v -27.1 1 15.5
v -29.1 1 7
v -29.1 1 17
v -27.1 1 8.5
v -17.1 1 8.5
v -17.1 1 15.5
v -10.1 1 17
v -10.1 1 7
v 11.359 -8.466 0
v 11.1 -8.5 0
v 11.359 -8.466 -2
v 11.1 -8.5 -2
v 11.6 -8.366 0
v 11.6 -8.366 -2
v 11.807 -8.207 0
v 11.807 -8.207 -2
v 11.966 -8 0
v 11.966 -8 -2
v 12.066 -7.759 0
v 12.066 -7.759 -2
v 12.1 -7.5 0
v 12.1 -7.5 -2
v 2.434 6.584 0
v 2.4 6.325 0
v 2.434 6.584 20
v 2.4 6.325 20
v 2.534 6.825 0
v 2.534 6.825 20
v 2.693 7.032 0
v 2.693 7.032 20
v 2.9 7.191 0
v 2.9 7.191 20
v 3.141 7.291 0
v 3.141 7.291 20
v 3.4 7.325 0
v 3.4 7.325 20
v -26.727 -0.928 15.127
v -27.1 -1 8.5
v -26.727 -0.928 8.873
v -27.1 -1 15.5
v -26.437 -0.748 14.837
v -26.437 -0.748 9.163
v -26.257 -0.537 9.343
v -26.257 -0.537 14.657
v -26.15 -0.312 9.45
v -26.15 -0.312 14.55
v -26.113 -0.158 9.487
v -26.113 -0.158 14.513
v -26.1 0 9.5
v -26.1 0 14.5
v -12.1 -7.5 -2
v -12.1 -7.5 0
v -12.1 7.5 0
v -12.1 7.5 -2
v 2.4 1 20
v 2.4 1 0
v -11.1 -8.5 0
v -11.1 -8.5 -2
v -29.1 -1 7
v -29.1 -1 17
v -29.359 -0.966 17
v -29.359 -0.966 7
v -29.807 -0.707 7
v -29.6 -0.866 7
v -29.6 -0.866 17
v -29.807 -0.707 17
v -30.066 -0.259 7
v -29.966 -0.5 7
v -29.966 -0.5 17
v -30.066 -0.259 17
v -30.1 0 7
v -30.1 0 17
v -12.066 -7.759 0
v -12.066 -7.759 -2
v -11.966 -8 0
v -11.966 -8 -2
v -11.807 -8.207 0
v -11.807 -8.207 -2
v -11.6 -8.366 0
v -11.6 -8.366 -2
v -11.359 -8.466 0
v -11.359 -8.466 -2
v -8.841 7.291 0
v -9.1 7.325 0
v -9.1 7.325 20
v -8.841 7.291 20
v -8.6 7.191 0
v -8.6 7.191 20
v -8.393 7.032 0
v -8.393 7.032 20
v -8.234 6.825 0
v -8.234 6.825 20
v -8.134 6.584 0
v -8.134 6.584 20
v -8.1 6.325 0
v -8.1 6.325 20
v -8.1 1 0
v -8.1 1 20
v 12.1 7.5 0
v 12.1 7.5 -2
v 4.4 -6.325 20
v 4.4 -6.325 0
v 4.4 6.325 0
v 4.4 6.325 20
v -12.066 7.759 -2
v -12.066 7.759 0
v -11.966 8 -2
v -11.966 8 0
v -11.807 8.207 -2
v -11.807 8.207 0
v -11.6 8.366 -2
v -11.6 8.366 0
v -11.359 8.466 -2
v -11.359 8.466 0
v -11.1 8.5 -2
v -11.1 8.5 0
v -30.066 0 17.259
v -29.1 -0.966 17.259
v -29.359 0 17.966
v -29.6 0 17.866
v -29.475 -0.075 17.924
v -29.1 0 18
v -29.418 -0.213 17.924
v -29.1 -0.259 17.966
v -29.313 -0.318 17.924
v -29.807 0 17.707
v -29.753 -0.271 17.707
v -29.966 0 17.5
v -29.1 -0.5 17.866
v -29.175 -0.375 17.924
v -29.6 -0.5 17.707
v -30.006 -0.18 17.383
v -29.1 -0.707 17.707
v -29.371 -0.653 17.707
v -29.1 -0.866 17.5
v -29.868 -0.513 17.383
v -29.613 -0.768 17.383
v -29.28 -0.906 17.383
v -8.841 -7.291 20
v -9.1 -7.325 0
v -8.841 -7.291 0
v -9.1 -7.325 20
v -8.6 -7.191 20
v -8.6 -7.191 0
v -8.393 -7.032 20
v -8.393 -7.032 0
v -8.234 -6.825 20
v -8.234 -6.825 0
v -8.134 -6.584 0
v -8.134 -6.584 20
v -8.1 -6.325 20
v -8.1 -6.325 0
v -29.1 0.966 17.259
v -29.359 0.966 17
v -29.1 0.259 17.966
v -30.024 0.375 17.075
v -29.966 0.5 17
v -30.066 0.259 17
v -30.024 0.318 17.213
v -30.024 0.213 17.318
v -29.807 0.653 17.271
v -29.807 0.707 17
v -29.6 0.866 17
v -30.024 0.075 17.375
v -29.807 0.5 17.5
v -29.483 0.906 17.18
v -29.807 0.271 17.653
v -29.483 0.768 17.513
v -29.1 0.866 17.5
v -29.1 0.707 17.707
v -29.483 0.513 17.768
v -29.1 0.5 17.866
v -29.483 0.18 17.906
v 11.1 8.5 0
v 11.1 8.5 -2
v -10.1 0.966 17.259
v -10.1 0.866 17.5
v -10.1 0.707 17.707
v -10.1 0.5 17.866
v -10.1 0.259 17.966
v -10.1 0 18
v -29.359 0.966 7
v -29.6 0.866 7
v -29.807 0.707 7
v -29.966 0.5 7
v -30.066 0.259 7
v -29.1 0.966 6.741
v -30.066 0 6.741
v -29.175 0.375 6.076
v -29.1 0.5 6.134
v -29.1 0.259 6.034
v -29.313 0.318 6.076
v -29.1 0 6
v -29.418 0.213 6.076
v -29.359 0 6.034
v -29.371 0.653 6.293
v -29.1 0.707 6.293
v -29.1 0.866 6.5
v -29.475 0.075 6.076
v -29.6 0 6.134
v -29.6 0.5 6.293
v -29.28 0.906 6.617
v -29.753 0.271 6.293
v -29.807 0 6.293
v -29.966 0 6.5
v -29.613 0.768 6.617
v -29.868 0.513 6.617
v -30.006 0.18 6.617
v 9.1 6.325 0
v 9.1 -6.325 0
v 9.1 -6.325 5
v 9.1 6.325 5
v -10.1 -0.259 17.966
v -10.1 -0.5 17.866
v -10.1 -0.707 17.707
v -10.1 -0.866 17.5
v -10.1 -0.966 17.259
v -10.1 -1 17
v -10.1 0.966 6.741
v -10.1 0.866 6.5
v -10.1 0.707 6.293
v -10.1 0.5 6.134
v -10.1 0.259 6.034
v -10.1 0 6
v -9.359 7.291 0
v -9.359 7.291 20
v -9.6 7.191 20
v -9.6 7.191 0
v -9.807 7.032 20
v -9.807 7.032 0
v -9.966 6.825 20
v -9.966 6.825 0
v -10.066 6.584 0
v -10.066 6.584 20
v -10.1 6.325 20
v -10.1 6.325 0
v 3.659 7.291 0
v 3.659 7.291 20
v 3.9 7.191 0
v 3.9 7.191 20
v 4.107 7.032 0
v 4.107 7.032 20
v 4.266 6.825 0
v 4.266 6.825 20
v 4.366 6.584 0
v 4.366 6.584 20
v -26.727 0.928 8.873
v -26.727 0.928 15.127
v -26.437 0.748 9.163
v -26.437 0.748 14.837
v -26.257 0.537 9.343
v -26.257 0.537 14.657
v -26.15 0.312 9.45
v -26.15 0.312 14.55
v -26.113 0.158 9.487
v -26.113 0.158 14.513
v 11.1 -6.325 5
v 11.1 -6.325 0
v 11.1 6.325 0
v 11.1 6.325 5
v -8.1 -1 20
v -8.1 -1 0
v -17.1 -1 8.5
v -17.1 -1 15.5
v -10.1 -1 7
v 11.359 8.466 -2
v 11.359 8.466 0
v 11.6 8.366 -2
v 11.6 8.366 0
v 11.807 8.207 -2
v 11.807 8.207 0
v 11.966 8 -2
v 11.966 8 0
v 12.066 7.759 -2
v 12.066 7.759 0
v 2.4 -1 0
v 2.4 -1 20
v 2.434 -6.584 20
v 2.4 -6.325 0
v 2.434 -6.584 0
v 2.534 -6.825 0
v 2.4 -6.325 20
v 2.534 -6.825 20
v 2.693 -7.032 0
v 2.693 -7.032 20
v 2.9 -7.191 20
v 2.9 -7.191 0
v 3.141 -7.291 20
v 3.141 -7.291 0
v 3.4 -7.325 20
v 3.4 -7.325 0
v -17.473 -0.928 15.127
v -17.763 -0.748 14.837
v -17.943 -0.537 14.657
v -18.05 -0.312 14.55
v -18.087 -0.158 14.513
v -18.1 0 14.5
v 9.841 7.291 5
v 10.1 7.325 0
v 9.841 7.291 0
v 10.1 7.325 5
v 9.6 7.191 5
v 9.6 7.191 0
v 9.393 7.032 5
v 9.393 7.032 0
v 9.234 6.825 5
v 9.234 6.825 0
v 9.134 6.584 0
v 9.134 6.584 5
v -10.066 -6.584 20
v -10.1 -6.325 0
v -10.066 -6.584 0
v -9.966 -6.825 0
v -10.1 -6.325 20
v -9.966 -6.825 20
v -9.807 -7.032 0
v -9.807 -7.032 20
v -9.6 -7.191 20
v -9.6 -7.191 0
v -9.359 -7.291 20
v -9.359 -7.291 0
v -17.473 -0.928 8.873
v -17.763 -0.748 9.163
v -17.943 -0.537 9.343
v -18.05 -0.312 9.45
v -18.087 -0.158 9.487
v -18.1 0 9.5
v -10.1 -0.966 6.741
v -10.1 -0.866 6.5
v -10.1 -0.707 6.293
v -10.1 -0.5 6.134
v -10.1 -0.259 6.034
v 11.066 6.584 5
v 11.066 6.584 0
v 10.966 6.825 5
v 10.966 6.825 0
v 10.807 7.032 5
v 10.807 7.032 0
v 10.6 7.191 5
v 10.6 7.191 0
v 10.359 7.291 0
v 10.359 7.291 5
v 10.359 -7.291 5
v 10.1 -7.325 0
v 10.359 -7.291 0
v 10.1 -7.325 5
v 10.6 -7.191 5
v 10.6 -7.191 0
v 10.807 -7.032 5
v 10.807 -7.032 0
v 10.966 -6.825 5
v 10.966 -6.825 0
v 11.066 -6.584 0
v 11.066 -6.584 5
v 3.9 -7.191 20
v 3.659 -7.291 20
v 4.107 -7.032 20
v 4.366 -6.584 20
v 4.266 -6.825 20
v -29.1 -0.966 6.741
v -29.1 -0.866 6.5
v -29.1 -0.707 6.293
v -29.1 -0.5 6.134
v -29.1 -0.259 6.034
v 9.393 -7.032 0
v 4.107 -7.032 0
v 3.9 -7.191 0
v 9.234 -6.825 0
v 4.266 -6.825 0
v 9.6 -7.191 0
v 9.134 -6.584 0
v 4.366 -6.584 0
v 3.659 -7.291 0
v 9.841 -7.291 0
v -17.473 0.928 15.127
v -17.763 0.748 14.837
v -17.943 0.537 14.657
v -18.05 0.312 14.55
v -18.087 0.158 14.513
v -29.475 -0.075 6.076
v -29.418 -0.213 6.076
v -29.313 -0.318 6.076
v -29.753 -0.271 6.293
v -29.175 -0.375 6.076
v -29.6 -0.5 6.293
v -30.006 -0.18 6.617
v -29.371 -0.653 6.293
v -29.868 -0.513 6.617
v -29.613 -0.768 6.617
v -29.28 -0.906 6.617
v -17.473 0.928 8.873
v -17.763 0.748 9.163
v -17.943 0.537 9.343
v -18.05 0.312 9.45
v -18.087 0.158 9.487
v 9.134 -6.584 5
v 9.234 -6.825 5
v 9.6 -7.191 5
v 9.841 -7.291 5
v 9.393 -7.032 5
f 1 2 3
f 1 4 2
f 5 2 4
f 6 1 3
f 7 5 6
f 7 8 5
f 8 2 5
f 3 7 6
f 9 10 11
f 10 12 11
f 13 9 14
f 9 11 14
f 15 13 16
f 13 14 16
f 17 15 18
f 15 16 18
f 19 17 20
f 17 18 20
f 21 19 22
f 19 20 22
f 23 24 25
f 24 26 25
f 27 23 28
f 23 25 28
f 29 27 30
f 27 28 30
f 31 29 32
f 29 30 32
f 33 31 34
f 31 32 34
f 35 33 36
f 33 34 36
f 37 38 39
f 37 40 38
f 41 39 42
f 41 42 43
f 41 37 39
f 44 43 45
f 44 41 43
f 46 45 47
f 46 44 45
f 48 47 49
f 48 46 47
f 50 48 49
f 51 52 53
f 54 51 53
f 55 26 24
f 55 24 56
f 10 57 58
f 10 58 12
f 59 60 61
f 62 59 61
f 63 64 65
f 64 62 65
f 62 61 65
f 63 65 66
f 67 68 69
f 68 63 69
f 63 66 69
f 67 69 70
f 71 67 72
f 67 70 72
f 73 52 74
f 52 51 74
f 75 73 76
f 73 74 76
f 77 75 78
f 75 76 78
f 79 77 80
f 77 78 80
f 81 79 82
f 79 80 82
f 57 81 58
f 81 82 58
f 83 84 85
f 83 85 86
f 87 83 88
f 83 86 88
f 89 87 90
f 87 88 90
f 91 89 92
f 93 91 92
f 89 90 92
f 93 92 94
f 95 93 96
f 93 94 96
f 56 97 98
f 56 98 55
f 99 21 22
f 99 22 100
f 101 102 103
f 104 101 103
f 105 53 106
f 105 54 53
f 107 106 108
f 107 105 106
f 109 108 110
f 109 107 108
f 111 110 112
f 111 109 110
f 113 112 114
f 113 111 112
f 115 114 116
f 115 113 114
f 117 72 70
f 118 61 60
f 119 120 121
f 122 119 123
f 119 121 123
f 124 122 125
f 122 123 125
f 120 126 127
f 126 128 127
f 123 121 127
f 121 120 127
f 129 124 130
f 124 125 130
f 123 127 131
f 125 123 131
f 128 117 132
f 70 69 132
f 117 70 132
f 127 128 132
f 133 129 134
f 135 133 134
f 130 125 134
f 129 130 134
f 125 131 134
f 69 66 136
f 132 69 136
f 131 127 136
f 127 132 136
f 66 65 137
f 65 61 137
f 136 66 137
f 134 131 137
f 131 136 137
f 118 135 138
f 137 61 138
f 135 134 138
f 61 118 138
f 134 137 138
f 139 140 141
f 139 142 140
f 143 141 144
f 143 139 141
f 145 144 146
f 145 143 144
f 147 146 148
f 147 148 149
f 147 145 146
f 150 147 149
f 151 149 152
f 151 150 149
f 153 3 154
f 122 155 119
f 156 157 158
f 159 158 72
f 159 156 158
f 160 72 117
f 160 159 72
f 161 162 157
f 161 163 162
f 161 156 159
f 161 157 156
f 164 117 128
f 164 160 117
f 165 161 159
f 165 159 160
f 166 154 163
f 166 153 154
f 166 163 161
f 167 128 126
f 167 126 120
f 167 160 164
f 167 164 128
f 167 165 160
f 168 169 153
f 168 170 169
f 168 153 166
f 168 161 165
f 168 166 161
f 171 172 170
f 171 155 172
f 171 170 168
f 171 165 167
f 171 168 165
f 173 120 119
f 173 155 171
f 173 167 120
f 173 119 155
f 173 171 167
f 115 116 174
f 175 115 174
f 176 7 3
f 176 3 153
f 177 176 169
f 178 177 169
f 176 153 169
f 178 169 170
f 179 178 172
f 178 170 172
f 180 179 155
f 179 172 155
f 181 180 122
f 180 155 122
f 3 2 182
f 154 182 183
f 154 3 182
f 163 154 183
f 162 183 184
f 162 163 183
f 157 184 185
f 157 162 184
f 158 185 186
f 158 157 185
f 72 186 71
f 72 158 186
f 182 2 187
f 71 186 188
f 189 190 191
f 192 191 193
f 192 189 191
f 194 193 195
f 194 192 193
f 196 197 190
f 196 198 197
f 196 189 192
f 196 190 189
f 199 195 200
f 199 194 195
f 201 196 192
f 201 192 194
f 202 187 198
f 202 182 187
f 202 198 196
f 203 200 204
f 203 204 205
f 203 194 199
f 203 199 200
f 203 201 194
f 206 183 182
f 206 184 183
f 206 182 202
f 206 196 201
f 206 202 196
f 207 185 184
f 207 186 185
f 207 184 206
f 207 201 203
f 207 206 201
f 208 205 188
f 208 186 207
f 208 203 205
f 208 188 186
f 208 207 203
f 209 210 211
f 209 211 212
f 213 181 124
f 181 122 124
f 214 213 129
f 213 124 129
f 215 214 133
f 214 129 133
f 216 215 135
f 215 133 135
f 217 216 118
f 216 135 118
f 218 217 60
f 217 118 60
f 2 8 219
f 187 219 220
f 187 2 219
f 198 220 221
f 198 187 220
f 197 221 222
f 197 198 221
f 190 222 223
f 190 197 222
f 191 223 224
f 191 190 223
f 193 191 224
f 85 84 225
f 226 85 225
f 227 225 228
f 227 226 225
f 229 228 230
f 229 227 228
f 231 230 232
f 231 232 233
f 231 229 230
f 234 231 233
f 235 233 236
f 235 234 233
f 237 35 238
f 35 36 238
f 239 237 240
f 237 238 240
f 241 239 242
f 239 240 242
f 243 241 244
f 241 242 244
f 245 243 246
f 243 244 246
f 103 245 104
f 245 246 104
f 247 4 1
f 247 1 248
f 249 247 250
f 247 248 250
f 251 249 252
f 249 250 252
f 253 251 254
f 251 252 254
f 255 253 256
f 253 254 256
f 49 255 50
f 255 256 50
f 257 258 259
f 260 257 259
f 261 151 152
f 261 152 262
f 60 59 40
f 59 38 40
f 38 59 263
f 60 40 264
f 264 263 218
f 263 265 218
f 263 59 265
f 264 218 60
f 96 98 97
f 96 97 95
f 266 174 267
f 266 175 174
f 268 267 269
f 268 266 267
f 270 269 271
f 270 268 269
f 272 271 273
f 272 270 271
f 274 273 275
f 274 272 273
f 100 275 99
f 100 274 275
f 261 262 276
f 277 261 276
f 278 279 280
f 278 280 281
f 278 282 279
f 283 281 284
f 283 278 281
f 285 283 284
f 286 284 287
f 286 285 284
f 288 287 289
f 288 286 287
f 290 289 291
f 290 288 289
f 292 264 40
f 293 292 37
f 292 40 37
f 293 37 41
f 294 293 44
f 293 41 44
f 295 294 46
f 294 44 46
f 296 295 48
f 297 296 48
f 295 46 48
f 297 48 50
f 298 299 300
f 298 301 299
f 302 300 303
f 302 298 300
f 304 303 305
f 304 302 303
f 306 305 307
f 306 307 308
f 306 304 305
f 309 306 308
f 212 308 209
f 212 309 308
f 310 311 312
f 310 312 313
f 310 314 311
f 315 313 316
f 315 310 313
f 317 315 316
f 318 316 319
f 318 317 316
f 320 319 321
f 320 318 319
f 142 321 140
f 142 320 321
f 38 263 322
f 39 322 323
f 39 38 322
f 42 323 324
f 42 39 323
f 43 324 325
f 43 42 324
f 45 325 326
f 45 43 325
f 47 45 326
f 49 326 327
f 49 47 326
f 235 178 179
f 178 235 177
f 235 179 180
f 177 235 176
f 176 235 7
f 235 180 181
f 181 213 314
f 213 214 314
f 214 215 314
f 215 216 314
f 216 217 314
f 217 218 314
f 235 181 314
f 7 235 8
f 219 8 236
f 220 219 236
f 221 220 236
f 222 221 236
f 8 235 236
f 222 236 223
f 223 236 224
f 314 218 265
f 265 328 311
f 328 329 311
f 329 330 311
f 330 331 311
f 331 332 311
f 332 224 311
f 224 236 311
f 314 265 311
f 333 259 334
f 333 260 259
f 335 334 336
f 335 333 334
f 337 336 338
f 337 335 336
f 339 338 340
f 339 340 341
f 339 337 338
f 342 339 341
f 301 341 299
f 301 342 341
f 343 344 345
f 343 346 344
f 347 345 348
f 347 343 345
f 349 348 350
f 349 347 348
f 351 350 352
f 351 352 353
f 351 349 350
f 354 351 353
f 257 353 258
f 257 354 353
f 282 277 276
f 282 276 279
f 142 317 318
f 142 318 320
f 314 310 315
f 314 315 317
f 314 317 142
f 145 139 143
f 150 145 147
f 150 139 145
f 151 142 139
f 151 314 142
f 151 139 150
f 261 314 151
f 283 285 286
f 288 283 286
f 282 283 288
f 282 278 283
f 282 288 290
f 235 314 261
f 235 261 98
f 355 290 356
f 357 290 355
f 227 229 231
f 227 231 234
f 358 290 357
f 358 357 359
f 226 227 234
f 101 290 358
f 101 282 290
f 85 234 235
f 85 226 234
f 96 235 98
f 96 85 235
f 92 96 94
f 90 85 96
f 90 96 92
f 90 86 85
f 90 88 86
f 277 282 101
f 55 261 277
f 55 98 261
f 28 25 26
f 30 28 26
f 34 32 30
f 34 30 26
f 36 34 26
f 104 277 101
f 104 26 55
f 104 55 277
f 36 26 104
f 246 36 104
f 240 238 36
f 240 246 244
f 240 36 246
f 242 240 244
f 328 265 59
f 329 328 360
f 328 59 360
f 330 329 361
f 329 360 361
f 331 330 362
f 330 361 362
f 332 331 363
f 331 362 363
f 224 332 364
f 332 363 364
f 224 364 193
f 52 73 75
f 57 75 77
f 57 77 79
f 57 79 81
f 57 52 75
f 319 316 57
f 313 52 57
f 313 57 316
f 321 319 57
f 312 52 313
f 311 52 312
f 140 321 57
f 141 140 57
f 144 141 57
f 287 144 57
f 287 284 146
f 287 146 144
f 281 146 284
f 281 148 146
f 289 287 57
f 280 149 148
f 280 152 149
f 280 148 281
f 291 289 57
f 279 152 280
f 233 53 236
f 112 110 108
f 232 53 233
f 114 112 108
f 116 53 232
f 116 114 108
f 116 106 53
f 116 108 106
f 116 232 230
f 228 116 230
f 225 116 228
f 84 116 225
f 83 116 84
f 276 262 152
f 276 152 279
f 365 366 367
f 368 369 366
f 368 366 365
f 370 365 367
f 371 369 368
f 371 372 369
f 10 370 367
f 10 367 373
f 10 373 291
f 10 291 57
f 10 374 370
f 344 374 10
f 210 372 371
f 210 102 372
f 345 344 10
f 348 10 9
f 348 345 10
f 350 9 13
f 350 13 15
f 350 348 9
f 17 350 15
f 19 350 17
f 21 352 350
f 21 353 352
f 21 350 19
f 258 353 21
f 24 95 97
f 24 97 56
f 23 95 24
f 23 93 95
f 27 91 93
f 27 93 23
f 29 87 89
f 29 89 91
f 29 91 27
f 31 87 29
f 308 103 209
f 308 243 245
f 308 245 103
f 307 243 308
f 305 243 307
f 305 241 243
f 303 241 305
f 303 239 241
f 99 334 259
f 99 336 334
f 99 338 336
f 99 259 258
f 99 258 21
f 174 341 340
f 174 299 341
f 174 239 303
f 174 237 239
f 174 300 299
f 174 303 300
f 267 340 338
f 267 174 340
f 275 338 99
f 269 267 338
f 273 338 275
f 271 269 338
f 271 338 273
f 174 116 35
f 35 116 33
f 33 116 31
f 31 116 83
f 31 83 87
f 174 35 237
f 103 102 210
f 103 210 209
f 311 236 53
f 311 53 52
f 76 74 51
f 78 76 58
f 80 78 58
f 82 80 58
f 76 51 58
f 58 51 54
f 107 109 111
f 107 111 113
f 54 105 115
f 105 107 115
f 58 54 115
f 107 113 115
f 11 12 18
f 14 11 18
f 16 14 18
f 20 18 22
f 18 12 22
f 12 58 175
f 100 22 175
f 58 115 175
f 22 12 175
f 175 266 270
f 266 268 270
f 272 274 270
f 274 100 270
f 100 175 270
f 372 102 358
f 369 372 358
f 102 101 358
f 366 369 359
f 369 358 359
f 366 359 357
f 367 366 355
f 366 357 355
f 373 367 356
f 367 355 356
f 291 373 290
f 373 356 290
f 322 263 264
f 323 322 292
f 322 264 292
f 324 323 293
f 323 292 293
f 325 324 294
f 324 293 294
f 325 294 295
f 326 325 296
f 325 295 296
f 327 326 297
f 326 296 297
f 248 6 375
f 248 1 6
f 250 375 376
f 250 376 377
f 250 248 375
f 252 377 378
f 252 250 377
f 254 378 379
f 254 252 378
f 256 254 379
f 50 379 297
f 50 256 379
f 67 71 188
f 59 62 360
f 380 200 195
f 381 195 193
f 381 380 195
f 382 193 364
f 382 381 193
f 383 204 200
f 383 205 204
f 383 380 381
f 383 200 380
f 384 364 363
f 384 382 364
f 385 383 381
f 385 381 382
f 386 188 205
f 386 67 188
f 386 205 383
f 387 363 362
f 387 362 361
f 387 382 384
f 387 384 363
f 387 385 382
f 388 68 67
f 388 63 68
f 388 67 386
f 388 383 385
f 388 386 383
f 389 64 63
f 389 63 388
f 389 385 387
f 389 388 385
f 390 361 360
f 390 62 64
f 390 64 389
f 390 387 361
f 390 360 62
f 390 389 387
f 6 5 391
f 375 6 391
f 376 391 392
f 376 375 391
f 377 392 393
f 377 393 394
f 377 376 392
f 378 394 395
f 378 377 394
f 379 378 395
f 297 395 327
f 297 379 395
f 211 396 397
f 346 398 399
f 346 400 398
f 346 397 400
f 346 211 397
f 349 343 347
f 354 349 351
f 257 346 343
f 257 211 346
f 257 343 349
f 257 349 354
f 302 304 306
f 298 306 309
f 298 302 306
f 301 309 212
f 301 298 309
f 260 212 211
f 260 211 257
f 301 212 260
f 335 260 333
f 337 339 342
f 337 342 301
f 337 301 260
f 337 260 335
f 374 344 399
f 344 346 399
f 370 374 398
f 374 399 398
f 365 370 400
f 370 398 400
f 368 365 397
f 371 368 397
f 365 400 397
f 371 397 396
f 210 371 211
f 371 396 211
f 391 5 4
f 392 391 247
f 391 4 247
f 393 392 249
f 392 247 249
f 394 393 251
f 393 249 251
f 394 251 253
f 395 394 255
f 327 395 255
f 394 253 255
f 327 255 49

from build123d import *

# Parameters (mm, degrees)
F0_W     = 24.2
F0_H     = 17
F0_W_2   = 2
F0_H_2   = 14.65
F0_W_3   = 10.5
F0_H_3   = 1
F1_DEPTH = 2
F2_DEPTH = 20
F3_DEPTH = 5
F4_W     = 2
F4_H     = 12
F5_DEPTH = 20
F6_W     = 8
F6_H     = 5
F7_DEPTH = 25
F8_R     = 0.99999


# Not quite as in the source:
# - a fillet or chamfer is up to 0.001 mm smaller than in the source, because OpenCascade refuses the exact size


with BuildPart() as f1:
    # F0 (on Top) → F1 (new body)
    with BuildSketch(Plane.XY):
        Rectangle(F0_W, F0_H)
        Polygon((-10.1, 7.325), (-8.1, 7.325), (-8.1, 1), (2.4, 1), (2.4, 7.325), (4.4, 7.325), (4.4, -7.325), (2.4, -7.325), (2.4, -1), (-8.1, -1), (-8.1, -7.325), (-10.1, -7.325), align=None, mode=Mode.SUBTRACT)
        with Locations((10.1, 0)):
            Rectangle(F0_W_2, F0_H_2, mode=Mode.SUBTRACT)
        Polygon((-8.1, 1), (-8.1, 7.325), (-10.1, 7.325), (-10.1, -7.325), (-8.1, -7.325), (-8.1, -1), (-8.1, 0), align=None)
        Polygon((2.4, 7.325), (2.4, 1), (2.4, 0), (2.4, -1), (2.4, -7.325), (4.4, -7.325), (4.4, 7.325), align=None)
        with Locations((10.1, 0)):
            Rectangle(F0_W_2, F0_H_2)
        with Locations((-2.85, -0.5)):
            Rectangle(F0_W_3, F0_H_3)
        with Locations((-2.85, 0.5)):
            Rectangle(F0_W_3, F0_H_3)
    extrude(amount=-F1_DEPTH)

    # F0 (on Top) → F2 (join)
    with BuildSketch(Plane.XY):
        Polygon((-8.1, 1), (-8.1, 7.325), (-10.1, 7.325), (-10.1, -7.325), (-8.1, -7.325), (-8.1, -1), (-8.1, 0), align=None)
        with Locations((-2.85, 0.5)):
            Rectangle(F0_W_3, F0_H_3)
        Polygon((2.4, 7.325), (2.4, 1), (2.4, 0), (2.4, -1), (2.4, -7.325), (4.4, -7.325), (4.4, 7.325), align=None)
        with Locations((-2.85, -0.5)):
            Rectangle(F0_W_3, F0_H_3)
    extrude(amount=F2_DEPTH)

    # F0 (on Top) → F3 (join)
    with BuildSketch(Plane.XY):
        with Locations((10.1, 0)):
            Rectangle(F0_W_2, F0_H_2)
    extrude(amount=F3_DEPTH)

    # F4 (on face) → F5 (join)
    with BuildSketch(Plane(origin=(-10.1, 0, 0), x_dir=(0, -1, 0), z_dir=(-1, 0, 0))):
        with Locations((0, 12)):
            Rectangle(F4_W, F4_H)
    extrude(amount=F5_DEPTH)

    # F6 (on face) → F7 (cut)
    with BuildSketch(Plane(origin=(0, 1, 0), x_dir=(-1, 0, 0), z_dir=(0, 1, 0))):
        with Locations((22.1, 12)):
            Rectangle(F6_W, F6_H)
    extrude(amount=-F7_DEPTH, mode=Mode.SUBTRACT)

    # F8 (radius 1 in the source; OpenCascade refuses exactly that, so slightly less here)
    f8_edges = [f1.edges().sort_by_distance(p)[0] for p in [
        (-12.1, -8.5, -1),
        (-12.1, 8.5, -1),
        (12.1, -8.5, -1),
        (12.1, 8.5, -1),
        (11.1, -7.325, 2.5),
        (9.1, -7.325, 2.5),
        (11.1, 7.325, 2.5),
        (9.1, 7.325, 2.5),
        (2.4, -7.325, 10),
        (4.4, -7.325, 10),
        (-8.1, -7.325, 10),
        (-10.1, -7.325, 10),
        (-10.1, 7.325, 10),
        (-8.1, 7.325, 10),
        (2.4, 7.325, 10),
        (4.4, 7.325, 10),
        (-20.1, 1, 18),
        (-30.1, 1, 12),
        (-30.1, -1, 12),
        (-20.1, 1, 6),
        (-30.1, 0, 6),
        (-30.1, 0, 18),
        (-20.1, -1, 18),
        (-20.1, -1, 6),
        (-22.1, 1, 14.5),
        (-18.1, 1, 12),
        (-22.1, 1, 9.5),
        (-26.1, 1, 12),
        (-18.1, -1, 12),
        (-22.1, -1, 9.5),
        (-22.1, -1, 14.5),
        (-26.1, -1, 12),
    ]]
    fillet(f8_edges, radius=F8_R)


solid = f1.part
